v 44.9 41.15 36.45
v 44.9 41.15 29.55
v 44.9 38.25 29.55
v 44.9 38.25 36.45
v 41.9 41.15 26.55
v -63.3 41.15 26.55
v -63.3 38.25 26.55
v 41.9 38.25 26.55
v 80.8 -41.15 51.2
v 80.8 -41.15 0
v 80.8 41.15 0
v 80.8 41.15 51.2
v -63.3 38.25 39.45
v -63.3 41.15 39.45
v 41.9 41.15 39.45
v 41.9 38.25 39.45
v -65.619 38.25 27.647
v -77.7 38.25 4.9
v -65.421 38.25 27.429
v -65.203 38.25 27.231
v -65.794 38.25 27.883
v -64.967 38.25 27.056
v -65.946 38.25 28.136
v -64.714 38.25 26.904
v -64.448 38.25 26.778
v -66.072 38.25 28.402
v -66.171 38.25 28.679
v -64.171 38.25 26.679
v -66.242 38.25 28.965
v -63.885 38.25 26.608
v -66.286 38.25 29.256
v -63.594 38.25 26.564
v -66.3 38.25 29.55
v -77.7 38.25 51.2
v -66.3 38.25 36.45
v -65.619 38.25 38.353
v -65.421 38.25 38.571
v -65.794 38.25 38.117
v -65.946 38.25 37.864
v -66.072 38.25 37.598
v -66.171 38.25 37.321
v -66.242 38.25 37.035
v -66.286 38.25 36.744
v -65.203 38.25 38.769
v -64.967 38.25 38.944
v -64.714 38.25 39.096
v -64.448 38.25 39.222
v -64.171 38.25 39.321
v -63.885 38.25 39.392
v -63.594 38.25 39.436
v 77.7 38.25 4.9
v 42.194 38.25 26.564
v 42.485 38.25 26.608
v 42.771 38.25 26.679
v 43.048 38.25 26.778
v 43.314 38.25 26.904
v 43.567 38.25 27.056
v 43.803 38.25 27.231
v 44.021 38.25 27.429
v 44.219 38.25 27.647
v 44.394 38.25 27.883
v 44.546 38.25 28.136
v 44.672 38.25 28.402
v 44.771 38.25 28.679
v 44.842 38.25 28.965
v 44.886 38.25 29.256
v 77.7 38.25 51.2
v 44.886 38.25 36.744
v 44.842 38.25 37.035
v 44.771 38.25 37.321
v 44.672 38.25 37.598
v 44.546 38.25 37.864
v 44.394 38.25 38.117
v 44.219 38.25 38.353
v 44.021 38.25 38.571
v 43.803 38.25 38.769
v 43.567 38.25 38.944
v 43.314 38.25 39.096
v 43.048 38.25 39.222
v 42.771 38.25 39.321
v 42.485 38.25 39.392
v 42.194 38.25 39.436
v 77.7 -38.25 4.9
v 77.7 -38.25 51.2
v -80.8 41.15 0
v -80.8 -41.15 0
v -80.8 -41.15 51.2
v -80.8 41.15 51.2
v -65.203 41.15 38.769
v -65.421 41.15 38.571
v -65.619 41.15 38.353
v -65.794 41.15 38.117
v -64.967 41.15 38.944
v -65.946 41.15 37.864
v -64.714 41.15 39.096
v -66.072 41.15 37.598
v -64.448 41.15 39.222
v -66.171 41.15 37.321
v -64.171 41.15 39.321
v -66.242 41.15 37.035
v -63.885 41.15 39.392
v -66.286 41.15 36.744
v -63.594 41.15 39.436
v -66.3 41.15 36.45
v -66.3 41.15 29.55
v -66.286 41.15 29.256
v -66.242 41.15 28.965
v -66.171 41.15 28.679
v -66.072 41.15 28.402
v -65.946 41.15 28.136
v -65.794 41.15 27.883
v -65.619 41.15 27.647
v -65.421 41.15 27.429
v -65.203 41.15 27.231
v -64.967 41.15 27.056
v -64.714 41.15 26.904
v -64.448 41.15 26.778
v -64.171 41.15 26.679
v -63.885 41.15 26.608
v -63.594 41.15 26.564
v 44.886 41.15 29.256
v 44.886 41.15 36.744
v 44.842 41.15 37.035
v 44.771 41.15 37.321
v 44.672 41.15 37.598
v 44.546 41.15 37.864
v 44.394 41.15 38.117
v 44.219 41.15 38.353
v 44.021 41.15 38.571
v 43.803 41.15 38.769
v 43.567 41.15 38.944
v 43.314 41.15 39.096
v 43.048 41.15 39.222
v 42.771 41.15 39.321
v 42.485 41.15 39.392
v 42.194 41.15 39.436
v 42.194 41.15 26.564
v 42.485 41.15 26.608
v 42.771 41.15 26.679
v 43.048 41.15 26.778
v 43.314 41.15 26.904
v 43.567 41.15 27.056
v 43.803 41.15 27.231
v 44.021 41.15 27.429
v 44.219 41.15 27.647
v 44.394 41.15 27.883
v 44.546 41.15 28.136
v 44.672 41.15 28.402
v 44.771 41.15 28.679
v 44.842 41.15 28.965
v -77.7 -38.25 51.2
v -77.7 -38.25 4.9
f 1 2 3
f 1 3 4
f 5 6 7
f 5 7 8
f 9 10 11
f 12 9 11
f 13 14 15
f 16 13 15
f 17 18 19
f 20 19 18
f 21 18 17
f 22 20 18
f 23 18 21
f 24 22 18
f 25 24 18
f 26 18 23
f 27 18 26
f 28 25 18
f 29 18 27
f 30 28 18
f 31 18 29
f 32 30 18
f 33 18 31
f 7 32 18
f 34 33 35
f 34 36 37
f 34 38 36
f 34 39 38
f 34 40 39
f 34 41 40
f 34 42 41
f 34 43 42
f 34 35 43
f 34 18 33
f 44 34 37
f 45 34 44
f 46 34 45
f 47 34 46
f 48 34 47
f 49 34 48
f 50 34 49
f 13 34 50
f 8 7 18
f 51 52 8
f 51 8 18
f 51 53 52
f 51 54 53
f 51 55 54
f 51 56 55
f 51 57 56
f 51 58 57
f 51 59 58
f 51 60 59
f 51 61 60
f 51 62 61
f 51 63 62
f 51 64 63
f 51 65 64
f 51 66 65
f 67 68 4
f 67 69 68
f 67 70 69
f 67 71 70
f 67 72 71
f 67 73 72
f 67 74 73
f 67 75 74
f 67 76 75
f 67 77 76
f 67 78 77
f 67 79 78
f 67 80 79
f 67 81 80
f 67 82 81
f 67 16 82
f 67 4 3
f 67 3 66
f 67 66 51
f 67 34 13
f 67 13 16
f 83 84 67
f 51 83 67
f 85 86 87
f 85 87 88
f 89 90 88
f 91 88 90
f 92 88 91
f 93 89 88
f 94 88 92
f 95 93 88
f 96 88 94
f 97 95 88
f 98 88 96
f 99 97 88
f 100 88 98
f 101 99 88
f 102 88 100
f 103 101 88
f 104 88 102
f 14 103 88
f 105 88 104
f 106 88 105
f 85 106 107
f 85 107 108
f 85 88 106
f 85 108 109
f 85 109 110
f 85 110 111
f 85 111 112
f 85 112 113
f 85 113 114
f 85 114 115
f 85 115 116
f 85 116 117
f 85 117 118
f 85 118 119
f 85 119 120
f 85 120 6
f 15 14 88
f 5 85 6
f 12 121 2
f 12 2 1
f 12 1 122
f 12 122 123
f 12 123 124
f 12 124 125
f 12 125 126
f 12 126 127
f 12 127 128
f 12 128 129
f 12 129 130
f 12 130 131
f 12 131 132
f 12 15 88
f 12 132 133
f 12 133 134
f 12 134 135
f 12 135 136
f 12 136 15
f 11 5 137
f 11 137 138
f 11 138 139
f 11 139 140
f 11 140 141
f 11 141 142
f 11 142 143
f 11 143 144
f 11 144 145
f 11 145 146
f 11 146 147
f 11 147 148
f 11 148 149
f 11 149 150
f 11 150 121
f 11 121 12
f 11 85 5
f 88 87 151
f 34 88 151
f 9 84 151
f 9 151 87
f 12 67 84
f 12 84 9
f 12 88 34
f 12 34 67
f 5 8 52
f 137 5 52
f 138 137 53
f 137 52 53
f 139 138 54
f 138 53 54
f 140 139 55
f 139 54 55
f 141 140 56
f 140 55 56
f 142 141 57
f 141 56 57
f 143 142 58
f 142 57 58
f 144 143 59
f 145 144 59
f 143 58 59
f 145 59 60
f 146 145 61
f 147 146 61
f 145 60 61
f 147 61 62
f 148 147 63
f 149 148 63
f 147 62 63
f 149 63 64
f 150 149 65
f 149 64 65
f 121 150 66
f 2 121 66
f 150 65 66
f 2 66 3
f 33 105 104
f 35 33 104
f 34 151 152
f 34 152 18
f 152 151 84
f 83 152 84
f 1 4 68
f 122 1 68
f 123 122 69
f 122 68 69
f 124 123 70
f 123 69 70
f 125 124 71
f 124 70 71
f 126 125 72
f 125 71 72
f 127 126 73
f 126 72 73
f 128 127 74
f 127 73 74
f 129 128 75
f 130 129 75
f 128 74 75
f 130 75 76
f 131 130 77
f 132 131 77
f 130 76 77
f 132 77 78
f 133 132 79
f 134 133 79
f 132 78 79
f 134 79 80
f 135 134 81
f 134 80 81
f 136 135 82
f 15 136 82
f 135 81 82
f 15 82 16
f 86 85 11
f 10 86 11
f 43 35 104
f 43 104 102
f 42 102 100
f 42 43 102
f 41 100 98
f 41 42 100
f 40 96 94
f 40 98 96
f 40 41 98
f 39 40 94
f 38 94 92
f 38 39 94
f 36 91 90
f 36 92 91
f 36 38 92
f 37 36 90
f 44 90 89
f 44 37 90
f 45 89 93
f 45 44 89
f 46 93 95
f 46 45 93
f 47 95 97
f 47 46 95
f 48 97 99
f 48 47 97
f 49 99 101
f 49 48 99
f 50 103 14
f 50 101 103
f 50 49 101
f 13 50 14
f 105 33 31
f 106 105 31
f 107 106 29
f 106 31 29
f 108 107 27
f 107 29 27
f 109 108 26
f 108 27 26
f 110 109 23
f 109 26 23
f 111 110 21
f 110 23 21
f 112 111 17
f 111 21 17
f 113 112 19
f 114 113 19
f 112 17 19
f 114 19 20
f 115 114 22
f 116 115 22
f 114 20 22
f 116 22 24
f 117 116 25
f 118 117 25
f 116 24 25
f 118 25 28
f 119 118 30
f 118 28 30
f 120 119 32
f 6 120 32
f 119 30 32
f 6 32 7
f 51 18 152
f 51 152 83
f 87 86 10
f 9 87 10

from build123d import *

# Parameters (mm, degrees)
SKETCH009_W  = 111.2
SKETCH009_H  = 12.9
PAD007_DEPTH = 30
FILLET001_R  = 3
SKETCH_W     = 161.6
SKETCH_H     = 82.3
PAD_DEPTH    = 51.2
SKETCH001_W  = 155.4
SKETCH001_H  = 76.5
POCKET_DEPTH = 46.3


with BuildPart() as tubecutout:
    # Sketch009 → Pad007 (new body)
    with BuildSketch(Plane(origin=(-10.7, 54, 33), x_dir=(1, 0, 0), z_dir=(0, -1, 0))):
        Rectangle(SKETCH009_W, SKETCH009_H)
    extrude(amount=PAD007_DEPTH)

    # Fillet001
    fillet001_edges = [tubecutout.edges().sort_by_distance(p)[0] for p in [
        (-66.3, 39, 39.45),
        (-66.3, 39, 26.55),
        (44.9, 39, 39.45),
        (44.9, 39, 26.55),
    ]]
    fillet(fillet001_edges, radius=FILLET001_R)


with BuildPart() as enclosurebox:
    # Sketch → Pad (new body)
    with BuildSketch(Plane.XY):
        Rectangle(SKETCH_W, SKETCH_H)
    extrude(amount=PAD_DEPTH)

    # Sketch001 → Pocket (cut)
    with BuildSketch(Plane.XY.offset(51.2)):
        Rectangle(SKETCH001_W, SKETCH001_H)
    extrude(amount=-POCKET_DEPTH, mode=Mode.SUBTRACT)

    # Cut: cut TubeCutout
    add(tubecutout.part, mode=Mode.SUBTRACT)


solid = enclosurebox.part
